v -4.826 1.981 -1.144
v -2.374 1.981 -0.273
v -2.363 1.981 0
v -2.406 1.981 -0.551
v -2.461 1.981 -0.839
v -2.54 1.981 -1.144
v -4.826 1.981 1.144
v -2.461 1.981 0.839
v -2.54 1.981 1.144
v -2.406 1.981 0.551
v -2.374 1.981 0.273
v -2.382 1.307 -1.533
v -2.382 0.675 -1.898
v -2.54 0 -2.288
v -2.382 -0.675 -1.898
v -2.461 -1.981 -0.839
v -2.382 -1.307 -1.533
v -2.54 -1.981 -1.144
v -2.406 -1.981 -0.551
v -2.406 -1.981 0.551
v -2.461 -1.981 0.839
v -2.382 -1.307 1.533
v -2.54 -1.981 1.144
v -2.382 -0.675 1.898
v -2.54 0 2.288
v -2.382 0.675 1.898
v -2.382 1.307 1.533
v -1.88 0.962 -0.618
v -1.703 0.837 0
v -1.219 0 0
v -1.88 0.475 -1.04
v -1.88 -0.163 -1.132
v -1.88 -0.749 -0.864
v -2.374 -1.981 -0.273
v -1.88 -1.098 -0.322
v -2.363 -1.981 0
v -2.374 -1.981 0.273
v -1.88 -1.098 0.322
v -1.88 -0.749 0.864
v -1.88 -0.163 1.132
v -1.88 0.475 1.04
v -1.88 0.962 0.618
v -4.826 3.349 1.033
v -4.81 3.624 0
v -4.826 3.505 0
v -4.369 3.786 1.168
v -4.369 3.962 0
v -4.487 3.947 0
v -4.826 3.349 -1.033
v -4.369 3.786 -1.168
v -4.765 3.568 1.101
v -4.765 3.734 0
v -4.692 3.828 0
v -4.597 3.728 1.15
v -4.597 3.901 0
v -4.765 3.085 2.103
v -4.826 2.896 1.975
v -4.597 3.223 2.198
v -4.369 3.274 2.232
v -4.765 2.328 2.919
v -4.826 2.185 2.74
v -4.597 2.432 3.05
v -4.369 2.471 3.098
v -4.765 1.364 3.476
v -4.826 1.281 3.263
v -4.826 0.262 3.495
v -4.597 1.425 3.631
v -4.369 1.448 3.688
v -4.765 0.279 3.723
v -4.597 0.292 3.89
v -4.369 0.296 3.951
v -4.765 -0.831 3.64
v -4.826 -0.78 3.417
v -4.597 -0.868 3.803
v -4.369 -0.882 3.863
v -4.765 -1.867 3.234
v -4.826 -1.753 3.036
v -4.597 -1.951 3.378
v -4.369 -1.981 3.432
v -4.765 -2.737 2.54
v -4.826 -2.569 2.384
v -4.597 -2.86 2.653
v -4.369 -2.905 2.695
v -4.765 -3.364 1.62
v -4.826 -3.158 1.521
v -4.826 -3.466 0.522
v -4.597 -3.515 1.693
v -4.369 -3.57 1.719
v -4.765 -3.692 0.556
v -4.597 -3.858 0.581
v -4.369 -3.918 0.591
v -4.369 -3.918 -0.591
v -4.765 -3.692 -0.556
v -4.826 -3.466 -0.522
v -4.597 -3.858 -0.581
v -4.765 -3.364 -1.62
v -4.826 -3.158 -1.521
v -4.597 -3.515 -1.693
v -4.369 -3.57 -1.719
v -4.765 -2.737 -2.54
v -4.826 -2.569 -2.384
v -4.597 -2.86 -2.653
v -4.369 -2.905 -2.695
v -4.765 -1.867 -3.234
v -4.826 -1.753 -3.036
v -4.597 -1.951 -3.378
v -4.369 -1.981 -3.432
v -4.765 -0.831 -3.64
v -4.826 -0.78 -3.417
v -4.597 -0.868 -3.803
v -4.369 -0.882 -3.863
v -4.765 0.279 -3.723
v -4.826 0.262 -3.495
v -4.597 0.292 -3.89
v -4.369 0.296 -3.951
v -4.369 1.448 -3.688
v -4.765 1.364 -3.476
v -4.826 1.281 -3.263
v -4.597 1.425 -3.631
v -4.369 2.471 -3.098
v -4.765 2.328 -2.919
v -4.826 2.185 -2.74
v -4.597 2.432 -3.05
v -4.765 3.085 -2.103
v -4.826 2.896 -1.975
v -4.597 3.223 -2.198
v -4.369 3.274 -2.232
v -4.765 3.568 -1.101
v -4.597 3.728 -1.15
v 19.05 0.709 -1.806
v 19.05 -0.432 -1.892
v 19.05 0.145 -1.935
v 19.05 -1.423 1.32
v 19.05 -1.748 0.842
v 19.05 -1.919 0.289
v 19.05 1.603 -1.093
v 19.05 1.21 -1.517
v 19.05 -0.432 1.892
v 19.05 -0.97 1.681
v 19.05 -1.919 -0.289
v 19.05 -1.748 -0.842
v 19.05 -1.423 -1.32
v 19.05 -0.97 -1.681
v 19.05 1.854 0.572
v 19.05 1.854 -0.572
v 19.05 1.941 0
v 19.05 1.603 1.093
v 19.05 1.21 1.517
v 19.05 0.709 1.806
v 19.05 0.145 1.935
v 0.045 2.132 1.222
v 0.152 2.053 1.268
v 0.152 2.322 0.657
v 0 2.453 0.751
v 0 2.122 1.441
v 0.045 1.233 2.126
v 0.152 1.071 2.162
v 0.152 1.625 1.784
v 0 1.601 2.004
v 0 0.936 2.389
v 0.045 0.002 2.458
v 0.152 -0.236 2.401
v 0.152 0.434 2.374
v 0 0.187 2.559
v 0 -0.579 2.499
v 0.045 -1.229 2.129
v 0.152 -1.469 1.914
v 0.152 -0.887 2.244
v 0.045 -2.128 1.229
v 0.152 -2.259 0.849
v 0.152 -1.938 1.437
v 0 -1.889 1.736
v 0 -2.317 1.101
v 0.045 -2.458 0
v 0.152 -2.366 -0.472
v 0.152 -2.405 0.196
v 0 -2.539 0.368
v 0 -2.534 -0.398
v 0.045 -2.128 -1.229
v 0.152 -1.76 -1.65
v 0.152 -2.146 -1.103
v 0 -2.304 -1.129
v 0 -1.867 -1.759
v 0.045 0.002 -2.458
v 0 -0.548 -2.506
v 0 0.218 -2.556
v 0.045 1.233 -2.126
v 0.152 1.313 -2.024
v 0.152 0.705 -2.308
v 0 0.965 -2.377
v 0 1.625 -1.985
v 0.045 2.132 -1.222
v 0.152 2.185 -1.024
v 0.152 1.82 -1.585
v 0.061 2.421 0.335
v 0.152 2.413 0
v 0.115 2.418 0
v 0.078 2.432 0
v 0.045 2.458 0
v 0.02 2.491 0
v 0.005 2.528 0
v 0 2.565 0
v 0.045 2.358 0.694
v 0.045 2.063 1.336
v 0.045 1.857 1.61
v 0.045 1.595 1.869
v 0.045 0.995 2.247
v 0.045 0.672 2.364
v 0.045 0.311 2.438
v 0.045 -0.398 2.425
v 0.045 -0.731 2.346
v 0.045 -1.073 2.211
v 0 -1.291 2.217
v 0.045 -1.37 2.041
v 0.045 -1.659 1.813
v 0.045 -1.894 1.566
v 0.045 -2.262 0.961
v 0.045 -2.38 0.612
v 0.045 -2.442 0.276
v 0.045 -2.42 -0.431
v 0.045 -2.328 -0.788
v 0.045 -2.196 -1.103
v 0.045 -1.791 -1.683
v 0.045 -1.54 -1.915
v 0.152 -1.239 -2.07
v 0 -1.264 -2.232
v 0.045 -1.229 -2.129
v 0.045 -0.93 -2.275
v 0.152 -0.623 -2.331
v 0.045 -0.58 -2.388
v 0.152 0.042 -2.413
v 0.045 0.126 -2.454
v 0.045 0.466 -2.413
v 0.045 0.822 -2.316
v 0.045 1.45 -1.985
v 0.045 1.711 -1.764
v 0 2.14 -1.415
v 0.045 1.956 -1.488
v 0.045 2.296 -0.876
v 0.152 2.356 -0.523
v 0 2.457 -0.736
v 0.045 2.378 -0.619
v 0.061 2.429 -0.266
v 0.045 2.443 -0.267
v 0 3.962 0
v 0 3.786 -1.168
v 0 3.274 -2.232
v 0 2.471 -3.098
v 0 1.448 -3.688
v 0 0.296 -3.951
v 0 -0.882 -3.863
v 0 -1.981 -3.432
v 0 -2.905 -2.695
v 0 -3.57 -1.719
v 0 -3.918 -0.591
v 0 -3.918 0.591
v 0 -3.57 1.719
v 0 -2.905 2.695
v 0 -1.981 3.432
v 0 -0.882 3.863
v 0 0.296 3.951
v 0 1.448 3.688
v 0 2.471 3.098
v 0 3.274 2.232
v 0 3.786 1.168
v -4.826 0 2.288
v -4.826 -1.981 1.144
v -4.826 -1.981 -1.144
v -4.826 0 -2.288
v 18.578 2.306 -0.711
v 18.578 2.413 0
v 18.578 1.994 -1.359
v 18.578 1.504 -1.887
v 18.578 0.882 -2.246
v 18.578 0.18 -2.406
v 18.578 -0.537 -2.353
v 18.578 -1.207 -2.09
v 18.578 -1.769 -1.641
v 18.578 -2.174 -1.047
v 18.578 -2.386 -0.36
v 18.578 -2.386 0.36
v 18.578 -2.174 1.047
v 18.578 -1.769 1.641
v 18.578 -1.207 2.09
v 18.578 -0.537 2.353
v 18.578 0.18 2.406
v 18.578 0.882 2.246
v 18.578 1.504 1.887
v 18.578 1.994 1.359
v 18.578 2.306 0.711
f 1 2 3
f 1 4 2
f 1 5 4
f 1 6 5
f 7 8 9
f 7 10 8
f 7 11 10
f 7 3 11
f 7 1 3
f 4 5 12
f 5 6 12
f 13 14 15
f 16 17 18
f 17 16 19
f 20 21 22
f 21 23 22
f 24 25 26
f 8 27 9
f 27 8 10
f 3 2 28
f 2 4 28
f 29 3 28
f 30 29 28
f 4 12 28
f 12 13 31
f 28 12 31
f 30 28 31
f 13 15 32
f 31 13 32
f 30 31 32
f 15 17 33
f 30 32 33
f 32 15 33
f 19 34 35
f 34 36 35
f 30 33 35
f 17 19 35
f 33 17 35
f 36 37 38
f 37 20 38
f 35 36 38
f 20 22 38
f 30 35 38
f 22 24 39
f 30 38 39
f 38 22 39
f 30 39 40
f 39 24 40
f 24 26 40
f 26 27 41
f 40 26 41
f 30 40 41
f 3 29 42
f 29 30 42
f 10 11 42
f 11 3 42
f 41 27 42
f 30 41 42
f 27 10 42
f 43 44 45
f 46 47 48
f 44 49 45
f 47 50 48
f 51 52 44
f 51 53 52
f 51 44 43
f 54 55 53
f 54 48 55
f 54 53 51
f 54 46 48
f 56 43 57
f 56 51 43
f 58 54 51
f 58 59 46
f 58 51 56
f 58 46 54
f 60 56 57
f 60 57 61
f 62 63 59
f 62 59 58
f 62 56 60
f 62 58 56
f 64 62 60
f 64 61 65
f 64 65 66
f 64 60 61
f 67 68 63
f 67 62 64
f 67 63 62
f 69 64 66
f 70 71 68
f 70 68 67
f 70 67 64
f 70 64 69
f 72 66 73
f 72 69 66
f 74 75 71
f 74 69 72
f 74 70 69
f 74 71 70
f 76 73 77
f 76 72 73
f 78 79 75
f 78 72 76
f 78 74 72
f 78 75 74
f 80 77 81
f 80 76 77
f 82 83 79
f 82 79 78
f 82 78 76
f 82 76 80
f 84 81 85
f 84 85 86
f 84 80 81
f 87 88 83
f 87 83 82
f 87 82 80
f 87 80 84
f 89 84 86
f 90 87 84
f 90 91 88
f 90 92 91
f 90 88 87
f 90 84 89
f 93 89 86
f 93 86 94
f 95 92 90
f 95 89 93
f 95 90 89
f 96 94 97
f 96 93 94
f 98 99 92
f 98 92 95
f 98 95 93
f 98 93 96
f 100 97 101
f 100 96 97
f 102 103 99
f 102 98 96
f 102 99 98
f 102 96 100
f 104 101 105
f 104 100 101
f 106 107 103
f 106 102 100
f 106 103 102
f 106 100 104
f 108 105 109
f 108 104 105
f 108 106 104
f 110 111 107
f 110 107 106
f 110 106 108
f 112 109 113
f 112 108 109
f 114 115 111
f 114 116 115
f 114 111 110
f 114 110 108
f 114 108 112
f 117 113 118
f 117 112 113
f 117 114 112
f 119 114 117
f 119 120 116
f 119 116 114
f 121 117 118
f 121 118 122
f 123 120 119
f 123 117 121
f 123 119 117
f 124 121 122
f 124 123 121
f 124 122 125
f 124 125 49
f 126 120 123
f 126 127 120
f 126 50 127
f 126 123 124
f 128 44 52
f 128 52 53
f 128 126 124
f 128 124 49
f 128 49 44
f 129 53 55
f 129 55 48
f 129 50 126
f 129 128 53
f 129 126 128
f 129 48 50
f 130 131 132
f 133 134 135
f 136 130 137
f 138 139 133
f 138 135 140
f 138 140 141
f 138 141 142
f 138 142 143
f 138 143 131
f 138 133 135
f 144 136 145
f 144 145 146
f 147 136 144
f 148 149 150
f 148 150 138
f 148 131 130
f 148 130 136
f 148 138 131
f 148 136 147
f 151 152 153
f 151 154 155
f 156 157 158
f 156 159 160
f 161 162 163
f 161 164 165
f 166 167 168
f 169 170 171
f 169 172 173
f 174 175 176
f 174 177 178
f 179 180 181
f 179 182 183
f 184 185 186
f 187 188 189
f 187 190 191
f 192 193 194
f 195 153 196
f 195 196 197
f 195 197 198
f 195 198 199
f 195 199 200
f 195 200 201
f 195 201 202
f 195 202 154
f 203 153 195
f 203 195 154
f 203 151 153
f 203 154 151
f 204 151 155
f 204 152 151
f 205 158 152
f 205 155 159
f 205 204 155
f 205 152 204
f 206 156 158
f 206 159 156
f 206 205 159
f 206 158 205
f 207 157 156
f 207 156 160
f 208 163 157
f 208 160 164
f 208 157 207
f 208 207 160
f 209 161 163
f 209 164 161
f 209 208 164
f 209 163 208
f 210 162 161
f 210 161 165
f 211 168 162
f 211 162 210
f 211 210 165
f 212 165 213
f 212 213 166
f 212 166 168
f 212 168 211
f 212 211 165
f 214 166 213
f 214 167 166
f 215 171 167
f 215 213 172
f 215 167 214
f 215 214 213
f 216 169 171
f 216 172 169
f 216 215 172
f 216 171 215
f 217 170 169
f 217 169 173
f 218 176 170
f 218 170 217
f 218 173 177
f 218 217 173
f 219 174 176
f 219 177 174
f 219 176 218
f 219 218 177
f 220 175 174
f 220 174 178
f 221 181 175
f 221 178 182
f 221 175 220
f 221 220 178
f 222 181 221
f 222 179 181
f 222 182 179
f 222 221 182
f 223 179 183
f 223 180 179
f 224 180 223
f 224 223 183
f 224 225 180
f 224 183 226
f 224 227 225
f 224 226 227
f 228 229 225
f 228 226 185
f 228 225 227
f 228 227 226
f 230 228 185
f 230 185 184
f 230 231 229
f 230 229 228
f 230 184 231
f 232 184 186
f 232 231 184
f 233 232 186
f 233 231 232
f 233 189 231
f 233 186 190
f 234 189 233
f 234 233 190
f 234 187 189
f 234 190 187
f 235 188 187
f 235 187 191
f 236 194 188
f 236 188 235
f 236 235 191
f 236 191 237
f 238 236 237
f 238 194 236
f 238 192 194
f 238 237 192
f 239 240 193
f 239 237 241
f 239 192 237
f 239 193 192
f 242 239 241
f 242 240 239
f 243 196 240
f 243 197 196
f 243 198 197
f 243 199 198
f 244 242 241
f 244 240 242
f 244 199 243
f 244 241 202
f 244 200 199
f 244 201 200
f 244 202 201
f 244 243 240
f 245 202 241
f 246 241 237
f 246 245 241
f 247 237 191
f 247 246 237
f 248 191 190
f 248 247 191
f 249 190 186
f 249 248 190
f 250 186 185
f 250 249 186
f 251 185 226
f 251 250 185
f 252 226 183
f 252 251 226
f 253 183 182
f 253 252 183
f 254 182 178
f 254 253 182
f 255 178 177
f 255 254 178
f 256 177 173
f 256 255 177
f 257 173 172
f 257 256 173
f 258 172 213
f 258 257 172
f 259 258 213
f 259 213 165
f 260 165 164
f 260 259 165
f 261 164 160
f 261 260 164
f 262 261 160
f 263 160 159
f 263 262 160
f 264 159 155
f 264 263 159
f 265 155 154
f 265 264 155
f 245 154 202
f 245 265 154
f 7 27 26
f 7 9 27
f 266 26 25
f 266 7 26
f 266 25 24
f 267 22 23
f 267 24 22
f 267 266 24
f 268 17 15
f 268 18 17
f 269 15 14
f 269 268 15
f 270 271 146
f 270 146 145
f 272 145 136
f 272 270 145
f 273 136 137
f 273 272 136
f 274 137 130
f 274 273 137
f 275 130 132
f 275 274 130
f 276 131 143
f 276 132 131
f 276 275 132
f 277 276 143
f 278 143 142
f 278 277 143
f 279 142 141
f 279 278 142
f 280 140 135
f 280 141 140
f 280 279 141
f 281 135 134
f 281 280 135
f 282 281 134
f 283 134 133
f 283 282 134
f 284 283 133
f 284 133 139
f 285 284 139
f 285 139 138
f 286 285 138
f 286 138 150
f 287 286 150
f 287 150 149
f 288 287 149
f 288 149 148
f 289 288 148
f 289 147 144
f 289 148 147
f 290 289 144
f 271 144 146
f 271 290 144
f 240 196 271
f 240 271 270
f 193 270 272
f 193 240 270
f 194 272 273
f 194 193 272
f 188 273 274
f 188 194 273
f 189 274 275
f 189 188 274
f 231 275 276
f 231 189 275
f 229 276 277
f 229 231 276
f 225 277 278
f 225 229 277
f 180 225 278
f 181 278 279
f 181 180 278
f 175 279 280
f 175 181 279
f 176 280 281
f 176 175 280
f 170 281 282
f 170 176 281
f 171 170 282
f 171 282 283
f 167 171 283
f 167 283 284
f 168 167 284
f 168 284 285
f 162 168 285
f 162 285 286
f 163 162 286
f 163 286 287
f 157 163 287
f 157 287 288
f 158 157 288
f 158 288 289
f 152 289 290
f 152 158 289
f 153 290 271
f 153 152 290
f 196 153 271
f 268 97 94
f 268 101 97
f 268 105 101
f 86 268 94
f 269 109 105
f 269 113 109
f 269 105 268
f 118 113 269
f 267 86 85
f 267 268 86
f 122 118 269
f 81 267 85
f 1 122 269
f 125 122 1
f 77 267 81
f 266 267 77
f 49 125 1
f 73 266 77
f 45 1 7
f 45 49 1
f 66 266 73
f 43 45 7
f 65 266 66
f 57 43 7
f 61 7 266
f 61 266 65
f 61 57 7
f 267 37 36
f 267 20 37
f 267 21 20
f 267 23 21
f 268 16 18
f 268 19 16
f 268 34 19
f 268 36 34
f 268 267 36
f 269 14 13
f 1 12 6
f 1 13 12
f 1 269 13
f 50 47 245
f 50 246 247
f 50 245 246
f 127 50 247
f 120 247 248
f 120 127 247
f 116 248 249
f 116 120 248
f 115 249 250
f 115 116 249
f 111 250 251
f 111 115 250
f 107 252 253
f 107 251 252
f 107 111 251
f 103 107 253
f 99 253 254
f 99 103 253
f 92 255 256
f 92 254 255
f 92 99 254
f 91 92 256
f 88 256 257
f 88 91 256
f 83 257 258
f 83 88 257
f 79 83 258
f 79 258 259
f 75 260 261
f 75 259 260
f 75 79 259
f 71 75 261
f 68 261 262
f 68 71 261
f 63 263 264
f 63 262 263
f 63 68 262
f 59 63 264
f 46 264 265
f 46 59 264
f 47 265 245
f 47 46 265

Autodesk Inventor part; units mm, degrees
ref_plane "YZ Plane" through (0, 0, 0) normal (1, 0, 0) x (0, 1, 0)
ref_plane "XZ Plane" through (0, 0, 0) normal (0, 1, 0) x (-1, 0, 0)
sketch "Sketch1" plane through (0, 0, 0) normal (0, 0, 1) x (1, 0, 0)
  line L0 (-1.2192, 0) -> (19.05, 0)
  line L1 (19.05, 0) -> (19.05, 2.413)
  line L2 (19.05, 2.413) -> (1.191, 2.413)
  line L3 (1.191, 2.413) -> (0.0001, 2.413)
  line L4 (0.0001, 2.413) -> (0, 2.413)
  line L5 (0, 2.413) -> (0, 3.9624)
  line L6 (0, 3.9624) -> (-4.826, 3.9624)
  line L7 (-4.826, 3.9624) -> (-4.826, 2.2877)
  line L8 (-4.826, 2.2877) -> (-2.54, 2.2877)
  line L9 (-2.54, 2.2877) -> (-1.2192, 0)
  line L10 (-9.6012, 0) -> (23.8252, 0) projected
  line L11 (0, -0.7925) -> (0, 4.7549) projected
  line L12 (1.191, 2.413) -> (0, 2.413) construction
  dimension "d1" = 17.859
  dimension "d2" = 1.1908
  dimension "d3" = 4.826
  dimension "d4" = 2.286
  dimension "d5" = 60
  dimension "d6" = 4.826
  dimension "d7" = 4.826
  dimension "d8" = 4.5754
  dimension "d9" = 7.9248
  dimension "d26" = 19.05
revolve "Body" add sketch "Sketch1" angle 360 about axis through (-1.2192, 0, 0) along (1, 0, 0)
sketch "Sketch2" plane through (-4.826, 0, 0) normal (-1, 0, 0) x (0, 0, 1)
  circle A0 centre (0, 0) radius 2.2877 projected
  line L0 (0, -5.5474) -> (0, 5.5474) projected
  line L1 (-5.5474, 0) -> (5.5474, 0) projected
  line L2 (2.2877, 0) -> (1.1438, -1.9812)
  line L3 (1.1438, -1.9812) -> (-1.1438, -1.9812)
  line L4 (-1.1438, -1.9812) -> (-2.2877, 0)
  line L5 (-2.2877, 0) -> (-1.1438, 1.9812)
  line L6 (-1.1438, 1.9812) -> (1.1438, 1.9812)
  line L7 (1.1438, 1.9812) -> (2.2877, 0)
extrude "Slot" add sketch "Sketch2" against normal up to next contours L7 A0 | A0 L2 | L6 L0 A0 | A0 L0 L3 | L0 L6 A0 | A0 L3 L0 | L4 A0 | A0 L5
fillet "Fillet1" radius 0.4572 1 edges at (-4.826, -3.9624, 0)
thread "Thread" size "10-32 UNF" class "2A" standard "ANSI Unified Screw Threads" length 17.859
chamfer "Chamfer1" distance 0.4724 distance2 0.4724 1 edges at (19.05, -2.413, 0) measured on face at (19.05, -1.2173, -0.6389)
ref_plane "Work Plane1" through (29, 0, 0) normal (0, -1, 0) x (1, 0, 0)
fillet "Fillet2" radius 0.1524 1 edges at (0.0001, -2.413, 0)
equation "\"d1\" = GEL"
equation "\"d3\" = KOH"
equation "\"d4\" = INTI"
equation "\"d6\" = GD"
equation "\"d7\" = BDM"
equation "\"d8\" = 1.1547 * SW"
equation "\"d9\" = KOD"
equation "\"d26\" = NLG"
equation "\"d30\" = R"
equation "\"d17\" = RR"
equation "\"d13\" = GEL"
equation "\"d15\" = -0.5 * SPD + 0.5 * GD"
equation "\"d16\" = GUL"
equation "\"GD\" = 4.826"
equation "\"NLG\" = 19.05"
equation "\"GEL\" = 17.85905"
equation "\"KOD\" = 7.9248"
equation "\"KOH\" = 4.826"
equation "\"INTI\" = 2.286"
equation "\"GAL\" = 1.19075"
equation "\"GUL\" = 0.47244"
equation "\"BDM\" = 4.826"
equation "\"SW\" = 3.9624"
equation "\"RR\" = 0.4572"
equation "\"SPD\" = 3.88112"
equation "\"R\" = 0.1524"
equation "\"PHH\" = 0.127"
equation "\"GD1\" = SPD"
equation "\"THREADDIA\" = 4.826"
equation "\"FAWI\" = 45deg"
equation "\"KOH1\" = 4.3434"
equation "\"NND\" = 4.826"
equation "\"TOA\" = 30deg"
equation "\"E0\" = 1.155 * SW"
properties part number "am-1047" material "Steel, Mild"
